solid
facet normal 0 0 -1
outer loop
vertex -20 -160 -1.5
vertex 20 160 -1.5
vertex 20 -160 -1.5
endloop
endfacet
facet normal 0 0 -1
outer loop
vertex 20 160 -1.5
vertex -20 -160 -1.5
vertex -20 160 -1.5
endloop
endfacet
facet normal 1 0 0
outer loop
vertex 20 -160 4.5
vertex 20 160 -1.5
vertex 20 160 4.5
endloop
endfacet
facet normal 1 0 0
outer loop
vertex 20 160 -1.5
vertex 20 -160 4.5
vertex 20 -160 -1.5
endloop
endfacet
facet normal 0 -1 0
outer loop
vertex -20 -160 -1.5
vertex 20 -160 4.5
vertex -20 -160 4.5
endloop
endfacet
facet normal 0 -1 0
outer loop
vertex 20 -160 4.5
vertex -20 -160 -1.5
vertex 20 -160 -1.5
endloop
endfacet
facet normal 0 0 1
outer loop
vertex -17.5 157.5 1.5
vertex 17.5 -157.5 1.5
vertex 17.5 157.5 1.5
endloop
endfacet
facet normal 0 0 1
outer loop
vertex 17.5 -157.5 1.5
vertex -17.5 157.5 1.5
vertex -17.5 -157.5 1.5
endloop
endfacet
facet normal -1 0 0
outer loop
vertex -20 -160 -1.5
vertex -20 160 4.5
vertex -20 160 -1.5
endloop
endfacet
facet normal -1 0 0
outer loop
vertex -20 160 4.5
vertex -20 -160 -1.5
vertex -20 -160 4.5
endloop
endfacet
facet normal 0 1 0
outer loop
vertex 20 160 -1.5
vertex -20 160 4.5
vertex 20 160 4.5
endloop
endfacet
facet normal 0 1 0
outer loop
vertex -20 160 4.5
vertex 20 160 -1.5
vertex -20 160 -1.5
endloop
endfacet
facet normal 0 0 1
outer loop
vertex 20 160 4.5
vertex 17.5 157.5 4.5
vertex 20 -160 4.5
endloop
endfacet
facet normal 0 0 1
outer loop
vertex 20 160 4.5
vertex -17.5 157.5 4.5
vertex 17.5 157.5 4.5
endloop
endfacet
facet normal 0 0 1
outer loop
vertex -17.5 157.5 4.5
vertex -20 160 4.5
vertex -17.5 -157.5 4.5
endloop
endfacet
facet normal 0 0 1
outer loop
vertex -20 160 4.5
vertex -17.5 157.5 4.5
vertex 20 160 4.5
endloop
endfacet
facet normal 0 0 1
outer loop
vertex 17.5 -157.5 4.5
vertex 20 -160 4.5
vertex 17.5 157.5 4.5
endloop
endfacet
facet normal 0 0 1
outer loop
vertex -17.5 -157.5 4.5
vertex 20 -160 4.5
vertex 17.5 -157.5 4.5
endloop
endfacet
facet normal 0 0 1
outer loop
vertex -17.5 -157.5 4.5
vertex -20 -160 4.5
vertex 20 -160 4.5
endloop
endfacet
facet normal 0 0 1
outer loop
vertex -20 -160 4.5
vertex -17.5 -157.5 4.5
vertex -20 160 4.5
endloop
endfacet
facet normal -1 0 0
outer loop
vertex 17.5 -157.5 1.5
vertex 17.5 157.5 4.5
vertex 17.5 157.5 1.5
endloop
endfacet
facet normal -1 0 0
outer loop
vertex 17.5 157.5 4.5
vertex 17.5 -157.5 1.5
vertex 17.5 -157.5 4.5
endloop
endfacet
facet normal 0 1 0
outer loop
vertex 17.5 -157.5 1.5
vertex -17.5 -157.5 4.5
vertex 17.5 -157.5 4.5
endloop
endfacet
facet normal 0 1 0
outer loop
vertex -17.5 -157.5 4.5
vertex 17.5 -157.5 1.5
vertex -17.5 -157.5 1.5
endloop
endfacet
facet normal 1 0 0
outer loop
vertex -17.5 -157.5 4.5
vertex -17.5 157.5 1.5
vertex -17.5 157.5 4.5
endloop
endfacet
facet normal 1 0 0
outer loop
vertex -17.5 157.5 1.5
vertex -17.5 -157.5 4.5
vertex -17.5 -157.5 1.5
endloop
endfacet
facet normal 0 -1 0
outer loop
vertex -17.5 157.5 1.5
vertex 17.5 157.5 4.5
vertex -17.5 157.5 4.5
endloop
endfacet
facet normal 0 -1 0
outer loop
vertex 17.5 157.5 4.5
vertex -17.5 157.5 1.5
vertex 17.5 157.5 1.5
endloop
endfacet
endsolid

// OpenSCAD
/*
 * Tao Steps Stamp
 */
 echo(version=version());

logo1 = "images/footprint_left.png";
logo2 = "images/footprint_right.png";
logoy = 400; // 343; 
logox = 626; 

module roundedRect(size, radius) {  
	linear_extrude(height=size.z, center=true) {
		offset(radius) offset(-radius) {
			square([size.x, size.y], center = true);
		}
	}
}


// Base plate
// ----------
nbSteps = 3; // Must be odd
betweenSteps = 100;

plateWidth = 40;
plateLength = 10 + (betweenSteps * nbSteps) + 10;  // before - steps - after

echo (str(">>> Plate length:", plateLength, " mm"));

plateThickNess = 3;
cornerRadius = 0;
ratio = 0.6;

module oneStep() {
  translate([0, -25, 2]) {
    scale([ratio * ((plateLength / (2 * nbSteps)) / 1) / logox, 
           ratio * plateWidth / logoy, .02]) {
      color("red") {
        rotate([0, 0, -0]) {
          surface(file=logo1, invert=true, center=true);
        }
      }
    }
  }
  translate([0, 25, 2]) {
    scale([ratio * ((plateLength / (2 * nbSteps)) / 1) / logox, 
           ratio * plateWidth / logoy, .02]) {
      color("green") {
        rotate([0, 0, -0]) {
          surface(file=logo2, invert=true, center=true);
        }
      }
    }
  }
}

from = -(nbSteps - 1) / 2;
to   = (nbSteps - 1) / 2;
//color("green") {
difference() {  
	union() {
		difference() {
			roundedRect([plateWidth, plateLength, plateThickNess], cornerRadius);
      for (i = [from:to]) {
        translate([0, (betweenSteps * i), 0]) {
          oneStep();
        }
      }
		}
		// The frame
		translate([0, 0, (plateThickNess / 1)]) {
			difference() {
				roundedRect([plateWidth, plateLength, plateThickNess], cornerRadius);
				roundedRect([plateWidth - 5, plateLength - 5, plateThickNess * 1.1], cornerRadius);
			}
		}
	}
}
//}
